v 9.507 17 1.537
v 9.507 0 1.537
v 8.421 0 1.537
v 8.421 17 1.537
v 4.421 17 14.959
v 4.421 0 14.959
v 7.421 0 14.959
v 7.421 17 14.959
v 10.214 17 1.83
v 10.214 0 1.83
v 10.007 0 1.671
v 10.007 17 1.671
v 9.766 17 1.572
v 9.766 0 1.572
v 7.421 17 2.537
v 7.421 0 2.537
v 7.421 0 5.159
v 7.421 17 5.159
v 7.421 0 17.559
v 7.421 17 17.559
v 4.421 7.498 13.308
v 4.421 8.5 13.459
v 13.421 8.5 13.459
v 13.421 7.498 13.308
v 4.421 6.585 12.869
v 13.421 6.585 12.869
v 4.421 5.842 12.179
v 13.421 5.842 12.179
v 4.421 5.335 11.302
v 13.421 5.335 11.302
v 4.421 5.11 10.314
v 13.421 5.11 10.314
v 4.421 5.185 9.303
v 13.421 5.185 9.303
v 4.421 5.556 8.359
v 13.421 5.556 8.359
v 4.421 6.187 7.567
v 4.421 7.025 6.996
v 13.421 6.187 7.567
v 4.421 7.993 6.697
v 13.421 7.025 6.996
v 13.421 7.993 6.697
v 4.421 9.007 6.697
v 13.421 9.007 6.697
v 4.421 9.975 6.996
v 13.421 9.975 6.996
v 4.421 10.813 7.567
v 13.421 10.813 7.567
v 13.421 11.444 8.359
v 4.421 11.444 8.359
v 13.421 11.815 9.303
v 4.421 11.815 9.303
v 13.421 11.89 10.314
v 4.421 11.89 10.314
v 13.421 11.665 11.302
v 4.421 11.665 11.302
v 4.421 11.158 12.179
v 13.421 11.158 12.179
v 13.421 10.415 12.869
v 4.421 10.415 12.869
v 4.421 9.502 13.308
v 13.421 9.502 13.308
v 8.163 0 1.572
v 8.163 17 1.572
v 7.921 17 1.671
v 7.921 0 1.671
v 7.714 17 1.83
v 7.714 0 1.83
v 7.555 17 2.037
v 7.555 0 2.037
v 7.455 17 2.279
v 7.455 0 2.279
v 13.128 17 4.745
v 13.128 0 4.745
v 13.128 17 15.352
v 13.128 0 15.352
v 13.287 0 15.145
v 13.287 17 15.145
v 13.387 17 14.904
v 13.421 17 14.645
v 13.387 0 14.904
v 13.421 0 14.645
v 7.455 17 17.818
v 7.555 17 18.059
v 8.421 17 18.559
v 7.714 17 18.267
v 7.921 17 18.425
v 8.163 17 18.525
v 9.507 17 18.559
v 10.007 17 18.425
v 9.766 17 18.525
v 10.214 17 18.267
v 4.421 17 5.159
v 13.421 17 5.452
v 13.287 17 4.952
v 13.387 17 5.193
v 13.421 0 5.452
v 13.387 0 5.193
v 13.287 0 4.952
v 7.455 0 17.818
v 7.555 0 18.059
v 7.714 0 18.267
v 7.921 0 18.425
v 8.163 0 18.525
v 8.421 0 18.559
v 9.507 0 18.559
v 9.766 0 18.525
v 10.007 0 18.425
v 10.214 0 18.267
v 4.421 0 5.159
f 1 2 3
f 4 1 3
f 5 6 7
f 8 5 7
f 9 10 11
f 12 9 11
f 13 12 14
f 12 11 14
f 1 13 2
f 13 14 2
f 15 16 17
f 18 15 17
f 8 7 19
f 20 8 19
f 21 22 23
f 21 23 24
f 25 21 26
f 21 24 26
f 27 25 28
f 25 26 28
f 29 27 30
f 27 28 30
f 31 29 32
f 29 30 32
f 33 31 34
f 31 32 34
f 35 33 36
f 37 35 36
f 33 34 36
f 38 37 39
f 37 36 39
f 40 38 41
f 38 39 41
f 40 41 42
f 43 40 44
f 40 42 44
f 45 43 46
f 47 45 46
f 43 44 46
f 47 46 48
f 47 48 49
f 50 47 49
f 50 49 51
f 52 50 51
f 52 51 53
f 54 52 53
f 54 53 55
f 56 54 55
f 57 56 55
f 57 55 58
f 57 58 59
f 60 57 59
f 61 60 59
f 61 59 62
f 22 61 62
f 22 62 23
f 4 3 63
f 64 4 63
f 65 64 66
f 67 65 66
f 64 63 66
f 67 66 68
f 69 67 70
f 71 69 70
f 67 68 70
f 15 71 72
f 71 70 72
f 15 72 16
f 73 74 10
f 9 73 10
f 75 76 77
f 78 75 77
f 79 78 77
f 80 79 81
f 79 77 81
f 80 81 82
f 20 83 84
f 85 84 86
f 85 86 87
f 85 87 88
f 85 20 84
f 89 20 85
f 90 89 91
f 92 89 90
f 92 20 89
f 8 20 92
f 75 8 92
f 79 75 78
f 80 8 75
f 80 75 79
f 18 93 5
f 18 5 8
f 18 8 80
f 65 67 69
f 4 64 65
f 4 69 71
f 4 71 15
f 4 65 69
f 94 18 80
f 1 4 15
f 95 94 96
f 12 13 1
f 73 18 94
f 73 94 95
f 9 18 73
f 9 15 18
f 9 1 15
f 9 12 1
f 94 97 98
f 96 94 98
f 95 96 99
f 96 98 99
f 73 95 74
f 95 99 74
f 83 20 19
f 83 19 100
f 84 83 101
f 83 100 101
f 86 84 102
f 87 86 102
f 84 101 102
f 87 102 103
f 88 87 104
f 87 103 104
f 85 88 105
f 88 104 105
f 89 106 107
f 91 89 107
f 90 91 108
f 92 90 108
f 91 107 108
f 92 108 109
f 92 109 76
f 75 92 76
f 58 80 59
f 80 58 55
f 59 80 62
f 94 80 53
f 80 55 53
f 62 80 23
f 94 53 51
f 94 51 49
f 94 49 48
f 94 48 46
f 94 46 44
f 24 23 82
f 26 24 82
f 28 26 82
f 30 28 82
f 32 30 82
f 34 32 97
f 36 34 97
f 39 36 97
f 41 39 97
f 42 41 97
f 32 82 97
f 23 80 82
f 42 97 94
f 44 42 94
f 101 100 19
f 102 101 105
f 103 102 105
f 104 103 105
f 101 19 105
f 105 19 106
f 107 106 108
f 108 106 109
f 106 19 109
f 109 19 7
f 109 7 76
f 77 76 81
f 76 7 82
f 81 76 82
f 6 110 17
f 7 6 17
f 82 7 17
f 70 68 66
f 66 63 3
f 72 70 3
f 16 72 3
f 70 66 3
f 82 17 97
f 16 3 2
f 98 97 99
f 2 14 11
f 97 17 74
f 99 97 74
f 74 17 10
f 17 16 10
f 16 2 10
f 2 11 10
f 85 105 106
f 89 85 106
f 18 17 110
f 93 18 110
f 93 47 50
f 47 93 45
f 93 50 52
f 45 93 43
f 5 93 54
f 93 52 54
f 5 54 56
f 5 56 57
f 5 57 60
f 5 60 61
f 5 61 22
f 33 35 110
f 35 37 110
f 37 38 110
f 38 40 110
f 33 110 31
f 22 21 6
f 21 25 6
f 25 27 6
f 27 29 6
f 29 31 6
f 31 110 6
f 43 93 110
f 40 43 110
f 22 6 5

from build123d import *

# Parameters (mm, degrees)
BOSS_EXTRUDE1_DEPTH = 17
M8_TAPPED_HOLE1_D   = 6.8


with BuildPart() as part:
    # Sketch1 → Boss-Extrude1 (new body)
    with BuildSketch(Plane(origin=(0, 0, 0), x_dir=(1, 0, 0), z_dir=(0, 1, 0))):
        with BuildLine():
            Line((10.214282758, -18.266545266), (13.128495977, -15.352332485))
            ThreePointArc((13.128495977, -15.352332485), (13.345268844, -15.027908548), (13.421388977, -14.645224485))
            Line((13.421388977, -14.645224485), (13.421388977, -5.451641485))
            ThreePointArc((13.421388977, -5.451641485), (13.345268461, -5.068958498), (13.128495977, -4.744535485))
            Line((13.128495977, -4.744535485), (10.214282758, -1.830320704))
            ThreePointArc((10.214282758, -1.830320704), (9.889859409, -1.613547953), (9.507175977, -1.537427485))
            Line((9.507175977, -1.537427485), (8.421388977, -1.537427485))
            ThreePointArc((8.421388977, -1.537427485), (7.714282177, -1.830320722), (7.421388977, -2.537427537))
            Line((7.421388977, -2.537427537), (7.421388977, -5.159438485))
            Line((7.421388977, -5.159438485), (4.421388977, -5.159438485))
            Line((4.421388977, -5.159438485), (4.421388977, -14.959438485))
            Line((4.421388977, -14.959438485), (7.421388977, -14.959438485))
            Line((7.421388977, -14.959438485), (7.421388977, -17.559438537))
            ThreePointArc((7.421388977, -17.559438537), (7.714282276, -18.266545347), (8.421389151, -18.559438485))
            Line((8.421389151, -18.559438485), (9.507176151, -18.559438485))
            ThreePointArc((9.507176151, -18.559438485), (9.88985949, -18.483317984), (10.214282758, -18.266545266))
        make_face()
    extrude(amount=BOSS_EXTRUDE1_DEPTH)

    # M8 Tapped Hole1 (through all)
    with Locations(Plane(origin=(4.421388977, 8.5, 10.059438485), x_dir=(0, 0, -1), z_dir=(-1, 0, 0))):
        with Locations((0, 0)):
            Hole(M8_TAPPED_HOLE1_D / 2)


solid = part.part
